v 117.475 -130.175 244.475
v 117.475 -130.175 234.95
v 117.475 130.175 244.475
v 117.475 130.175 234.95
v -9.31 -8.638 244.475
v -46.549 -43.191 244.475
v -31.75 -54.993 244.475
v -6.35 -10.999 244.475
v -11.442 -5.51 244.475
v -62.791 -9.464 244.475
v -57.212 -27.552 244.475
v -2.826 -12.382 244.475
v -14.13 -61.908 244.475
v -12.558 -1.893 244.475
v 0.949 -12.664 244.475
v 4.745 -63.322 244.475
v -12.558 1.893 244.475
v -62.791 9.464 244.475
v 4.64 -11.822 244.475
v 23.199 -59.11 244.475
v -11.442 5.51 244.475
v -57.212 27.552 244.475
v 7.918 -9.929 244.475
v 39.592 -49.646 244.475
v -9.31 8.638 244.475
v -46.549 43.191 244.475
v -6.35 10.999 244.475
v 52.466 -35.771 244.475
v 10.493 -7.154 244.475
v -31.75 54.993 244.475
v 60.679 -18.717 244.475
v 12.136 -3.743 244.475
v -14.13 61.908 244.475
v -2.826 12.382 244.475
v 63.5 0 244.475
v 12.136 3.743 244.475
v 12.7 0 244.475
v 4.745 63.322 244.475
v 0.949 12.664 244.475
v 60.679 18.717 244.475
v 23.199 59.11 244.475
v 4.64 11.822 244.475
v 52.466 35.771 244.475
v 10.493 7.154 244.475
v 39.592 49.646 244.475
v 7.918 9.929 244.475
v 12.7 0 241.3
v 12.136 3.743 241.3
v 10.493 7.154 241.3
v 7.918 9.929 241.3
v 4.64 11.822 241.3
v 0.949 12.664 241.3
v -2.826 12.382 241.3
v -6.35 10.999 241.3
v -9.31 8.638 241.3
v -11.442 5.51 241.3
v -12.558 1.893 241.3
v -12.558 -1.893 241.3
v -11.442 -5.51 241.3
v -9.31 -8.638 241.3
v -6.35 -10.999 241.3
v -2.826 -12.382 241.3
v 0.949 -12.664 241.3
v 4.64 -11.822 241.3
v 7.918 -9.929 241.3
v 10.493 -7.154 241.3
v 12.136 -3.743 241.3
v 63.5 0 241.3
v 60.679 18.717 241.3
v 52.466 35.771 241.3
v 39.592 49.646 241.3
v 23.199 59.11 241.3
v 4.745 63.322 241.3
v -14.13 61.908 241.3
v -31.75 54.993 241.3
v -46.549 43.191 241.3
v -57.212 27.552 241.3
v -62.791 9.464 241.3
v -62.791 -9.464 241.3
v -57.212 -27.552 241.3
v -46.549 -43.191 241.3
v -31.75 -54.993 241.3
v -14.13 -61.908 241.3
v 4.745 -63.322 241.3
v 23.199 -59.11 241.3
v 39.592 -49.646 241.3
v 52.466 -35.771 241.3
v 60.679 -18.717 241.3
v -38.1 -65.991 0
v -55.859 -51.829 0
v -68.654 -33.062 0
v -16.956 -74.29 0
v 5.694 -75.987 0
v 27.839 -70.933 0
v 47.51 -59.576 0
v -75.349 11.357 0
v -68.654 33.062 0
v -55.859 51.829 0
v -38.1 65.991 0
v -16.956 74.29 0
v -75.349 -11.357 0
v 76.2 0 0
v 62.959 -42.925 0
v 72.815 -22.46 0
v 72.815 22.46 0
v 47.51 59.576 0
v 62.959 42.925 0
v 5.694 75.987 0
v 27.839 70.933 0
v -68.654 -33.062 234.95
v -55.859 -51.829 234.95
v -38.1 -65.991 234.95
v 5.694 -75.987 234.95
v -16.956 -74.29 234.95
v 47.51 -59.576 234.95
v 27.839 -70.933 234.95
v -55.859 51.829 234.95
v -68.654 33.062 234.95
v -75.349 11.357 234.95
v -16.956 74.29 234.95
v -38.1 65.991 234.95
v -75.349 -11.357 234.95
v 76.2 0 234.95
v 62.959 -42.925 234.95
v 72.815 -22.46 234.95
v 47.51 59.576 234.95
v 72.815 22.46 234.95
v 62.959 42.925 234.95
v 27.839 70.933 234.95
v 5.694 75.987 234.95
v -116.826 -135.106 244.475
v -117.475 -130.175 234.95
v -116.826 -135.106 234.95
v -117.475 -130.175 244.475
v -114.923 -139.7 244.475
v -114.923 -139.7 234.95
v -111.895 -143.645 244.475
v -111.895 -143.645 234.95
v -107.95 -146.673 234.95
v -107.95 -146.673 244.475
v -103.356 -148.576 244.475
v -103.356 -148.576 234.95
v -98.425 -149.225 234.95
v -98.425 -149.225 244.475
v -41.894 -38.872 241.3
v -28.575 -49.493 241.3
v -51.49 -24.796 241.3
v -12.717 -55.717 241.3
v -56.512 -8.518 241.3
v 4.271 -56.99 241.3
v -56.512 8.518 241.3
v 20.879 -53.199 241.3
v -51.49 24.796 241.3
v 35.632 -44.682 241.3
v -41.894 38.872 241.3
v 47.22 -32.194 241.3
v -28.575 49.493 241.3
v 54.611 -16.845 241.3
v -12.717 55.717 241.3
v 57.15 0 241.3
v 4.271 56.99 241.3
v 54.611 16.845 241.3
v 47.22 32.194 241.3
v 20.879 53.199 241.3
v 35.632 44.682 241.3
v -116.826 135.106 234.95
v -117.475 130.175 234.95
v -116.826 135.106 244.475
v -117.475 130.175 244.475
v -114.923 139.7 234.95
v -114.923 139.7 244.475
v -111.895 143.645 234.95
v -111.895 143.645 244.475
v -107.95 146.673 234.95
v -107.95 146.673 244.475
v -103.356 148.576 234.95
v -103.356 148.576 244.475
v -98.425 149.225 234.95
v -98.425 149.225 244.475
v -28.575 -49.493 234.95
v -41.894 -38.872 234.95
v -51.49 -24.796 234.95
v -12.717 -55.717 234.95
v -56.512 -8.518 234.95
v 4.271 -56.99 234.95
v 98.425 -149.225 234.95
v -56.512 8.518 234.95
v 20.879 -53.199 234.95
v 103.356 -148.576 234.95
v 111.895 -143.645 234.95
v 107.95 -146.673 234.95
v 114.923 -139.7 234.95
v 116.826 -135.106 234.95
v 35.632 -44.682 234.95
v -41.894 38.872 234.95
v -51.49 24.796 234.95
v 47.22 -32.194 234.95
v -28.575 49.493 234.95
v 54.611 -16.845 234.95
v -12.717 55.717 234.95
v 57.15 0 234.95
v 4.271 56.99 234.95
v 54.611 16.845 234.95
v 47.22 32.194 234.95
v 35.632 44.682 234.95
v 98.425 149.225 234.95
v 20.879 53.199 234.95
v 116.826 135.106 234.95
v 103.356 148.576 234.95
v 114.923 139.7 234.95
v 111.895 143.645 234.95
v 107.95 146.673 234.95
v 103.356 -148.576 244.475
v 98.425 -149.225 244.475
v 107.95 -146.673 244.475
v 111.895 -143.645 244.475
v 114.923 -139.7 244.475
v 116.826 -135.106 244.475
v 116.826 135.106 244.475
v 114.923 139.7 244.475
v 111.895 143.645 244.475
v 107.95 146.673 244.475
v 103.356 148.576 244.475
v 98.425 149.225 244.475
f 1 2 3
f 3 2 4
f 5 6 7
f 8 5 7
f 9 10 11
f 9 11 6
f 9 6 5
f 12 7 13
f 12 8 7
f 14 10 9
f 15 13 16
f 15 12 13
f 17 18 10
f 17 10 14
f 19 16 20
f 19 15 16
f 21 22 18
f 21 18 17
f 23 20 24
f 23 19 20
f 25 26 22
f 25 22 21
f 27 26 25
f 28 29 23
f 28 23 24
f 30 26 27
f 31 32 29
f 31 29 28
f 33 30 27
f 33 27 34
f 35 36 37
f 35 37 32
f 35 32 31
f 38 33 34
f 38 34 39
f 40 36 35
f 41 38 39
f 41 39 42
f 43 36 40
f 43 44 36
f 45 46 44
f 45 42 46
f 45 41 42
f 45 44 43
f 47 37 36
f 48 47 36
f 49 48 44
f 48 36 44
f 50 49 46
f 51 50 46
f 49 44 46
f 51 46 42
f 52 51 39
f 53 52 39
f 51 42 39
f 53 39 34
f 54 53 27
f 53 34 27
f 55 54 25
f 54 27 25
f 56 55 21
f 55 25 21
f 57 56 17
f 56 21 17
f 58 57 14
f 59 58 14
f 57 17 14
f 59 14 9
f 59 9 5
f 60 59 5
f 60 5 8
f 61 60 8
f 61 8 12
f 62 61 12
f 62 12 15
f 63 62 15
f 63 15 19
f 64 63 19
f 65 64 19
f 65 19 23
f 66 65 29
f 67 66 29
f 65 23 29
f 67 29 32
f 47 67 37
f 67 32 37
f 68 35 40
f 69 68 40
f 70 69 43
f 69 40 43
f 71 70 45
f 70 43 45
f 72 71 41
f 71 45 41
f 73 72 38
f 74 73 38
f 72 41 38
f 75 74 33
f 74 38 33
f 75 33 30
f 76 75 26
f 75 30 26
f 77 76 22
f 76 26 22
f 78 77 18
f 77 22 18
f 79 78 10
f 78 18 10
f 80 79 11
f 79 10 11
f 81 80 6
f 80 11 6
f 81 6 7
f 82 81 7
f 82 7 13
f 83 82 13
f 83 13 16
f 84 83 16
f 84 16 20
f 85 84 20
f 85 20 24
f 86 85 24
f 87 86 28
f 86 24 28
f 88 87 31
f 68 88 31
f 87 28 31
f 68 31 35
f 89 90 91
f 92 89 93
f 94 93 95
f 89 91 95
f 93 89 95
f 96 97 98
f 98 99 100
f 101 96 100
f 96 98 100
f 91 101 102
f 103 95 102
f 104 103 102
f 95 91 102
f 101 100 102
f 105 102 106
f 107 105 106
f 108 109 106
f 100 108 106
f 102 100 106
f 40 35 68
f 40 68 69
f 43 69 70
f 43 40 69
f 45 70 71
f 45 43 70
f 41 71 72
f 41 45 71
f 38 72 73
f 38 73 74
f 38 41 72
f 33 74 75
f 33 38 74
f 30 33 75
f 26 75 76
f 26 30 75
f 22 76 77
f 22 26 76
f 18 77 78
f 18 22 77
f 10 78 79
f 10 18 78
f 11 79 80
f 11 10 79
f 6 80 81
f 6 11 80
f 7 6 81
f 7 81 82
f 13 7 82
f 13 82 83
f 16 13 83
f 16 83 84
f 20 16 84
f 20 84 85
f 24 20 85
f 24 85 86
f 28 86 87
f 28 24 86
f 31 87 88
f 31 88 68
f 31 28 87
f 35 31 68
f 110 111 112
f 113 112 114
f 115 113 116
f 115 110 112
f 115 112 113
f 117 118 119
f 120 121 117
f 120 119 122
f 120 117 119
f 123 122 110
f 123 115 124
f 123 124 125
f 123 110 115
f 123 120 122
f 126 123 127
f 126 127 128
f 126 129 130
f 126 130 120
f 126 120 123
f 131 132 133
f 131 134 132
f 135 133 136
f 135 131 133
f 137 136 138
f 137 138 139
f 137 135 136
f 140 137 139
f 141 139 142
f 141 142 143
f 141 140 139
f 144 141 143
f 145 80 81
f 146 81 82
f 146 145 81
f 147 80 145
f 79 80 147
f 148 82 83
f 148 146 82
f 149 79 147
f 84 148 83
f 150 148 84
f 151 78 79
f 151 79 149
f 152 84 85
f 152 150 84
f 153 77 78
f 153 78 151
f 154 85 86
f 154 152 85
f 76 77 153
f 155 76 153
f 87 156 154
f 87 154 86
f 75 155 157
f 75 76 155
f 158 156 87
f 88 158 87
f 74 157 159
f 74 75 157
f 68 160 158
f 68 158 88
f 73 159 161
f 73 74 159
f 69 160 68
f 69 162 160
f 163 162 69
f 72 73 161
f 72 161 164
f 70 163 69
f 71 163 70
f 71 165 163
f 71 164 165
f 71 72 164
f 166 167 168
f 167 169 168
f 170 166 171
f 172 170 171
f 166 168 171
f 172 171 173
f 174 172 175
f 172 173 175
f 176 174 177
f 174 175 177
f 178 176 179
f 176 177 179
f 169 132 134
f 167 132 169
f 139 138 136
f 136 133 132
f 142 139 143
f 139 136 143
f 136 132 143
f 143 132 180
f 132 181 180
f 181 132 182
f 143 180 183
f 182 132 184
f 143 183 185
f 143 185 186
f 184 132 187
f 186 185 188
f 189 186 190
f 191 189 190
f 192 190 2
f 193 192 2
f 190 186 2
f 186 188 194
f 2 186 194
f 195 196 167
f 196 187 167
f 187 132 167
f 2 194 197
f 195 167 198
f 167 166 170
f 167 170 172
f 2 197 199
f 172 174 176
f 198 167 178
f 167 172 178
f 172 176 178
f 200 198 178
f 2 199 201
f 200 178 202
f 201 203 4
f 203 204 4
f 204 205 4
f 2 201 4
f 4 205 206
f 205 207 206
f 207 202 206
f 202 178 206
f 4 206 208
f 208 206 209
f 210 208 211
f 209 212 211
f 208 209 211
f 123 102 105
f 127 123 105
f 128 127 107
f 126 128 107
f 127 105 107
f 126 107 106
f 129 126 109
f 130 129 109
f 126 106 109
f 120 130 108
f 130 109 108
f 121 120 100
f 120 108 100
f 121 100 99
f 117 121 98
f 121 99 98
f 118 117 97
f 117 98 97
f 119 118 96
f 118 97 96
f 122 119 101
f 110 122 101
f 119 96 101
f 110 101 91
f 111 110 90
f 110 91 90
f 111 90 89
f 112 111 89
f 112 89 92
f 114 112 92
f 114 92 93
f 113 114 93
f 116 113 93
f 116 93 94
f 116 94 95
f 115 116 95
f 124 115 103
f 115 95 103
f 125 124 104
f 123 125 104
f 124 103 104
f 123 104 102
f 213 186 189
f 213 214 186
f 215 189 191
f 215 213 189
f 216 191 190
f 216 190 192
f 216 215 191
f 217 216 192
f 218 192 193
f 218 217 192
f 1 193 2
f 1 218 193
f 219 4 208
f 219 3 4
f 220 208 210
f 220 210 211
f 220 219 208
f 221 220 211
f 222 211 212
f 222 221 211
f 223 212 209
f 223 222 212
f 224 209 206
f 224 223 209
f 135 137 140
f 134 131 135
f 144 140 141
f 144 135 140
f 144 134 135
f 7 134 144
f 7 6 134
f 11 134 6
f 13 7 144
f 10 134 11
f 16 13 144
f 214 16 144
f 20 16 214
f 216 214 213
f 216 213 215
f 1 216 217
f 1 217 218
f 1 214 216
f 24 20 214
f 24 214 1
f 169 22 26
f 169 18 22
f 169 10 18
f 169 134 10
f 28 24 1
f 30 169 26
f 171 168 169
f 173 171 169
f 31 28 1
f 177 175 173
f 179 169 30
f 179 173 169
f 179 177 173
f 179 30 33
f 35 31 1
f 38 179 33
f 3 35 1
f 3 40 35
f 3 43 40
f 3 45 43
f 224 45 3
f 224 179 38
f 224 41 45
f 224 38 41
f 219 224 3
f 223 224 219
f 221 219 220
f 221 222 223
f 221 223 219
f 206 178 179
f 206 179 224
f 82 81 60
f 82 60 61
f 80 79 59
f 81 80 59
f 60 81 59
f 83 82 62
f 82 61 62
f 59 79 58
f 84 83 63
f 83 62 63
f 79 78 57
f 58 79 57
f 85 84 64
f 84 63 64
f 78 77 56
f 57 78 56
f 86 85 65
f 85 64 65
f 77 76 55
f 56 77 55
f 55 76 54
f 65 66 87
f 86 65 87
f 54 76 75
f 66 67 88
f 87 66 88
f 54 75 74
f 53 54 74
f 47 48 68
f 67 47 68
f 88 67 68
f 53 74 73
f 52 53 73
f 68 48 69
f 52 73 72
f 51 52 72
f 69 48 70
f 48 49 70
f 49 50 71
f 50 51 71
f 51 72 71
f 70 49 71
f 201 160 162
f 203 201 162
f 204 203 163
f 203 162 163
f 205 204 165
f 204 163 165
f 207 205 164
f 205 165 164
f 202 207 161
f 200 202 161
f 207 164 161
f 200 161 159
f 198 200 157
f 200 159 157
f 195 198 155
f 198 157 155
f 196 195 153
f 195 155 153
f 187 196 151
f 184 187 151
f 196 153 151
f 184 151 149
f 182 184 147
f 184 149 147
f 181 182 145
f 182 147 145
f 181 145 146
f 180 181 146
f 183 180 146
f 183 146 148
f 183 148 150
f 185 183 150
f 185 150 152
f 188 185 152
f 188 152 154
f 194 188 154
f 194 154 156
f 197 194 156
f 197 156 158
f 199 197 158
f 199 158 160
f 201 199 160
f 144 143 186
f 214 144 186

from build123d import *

# Parameters (mm, degrees)
F0_R      = 76.2
F1_DEPTH  = 234.95
F2_W      = 234.95
F2_H      = 298.45
F2_R      = 76.2
F3_DEPTH  = 9.525
F4_R      = 19.05
F6_DEPTH  = 3.175
F7_R      = 57.15
F8_DEPTH  = 241.301
F9_R      = 63.5
F9_R_2    = 12.7
F10_DEPTH = 3.175


# Not quite as in the source:
# - a length typed as a fraction of an inch, garbled in the dataset ("3 / 203.2 mm" for 3/8 in), is restored


with BuildPart() as f1:
    # F0 (on Top) → F1 (new body)
    with BuildSketch(Plane.XY):
        Circle(F0_R)
    extrude(amount=F1_DEPTH)


with BuildPart() as f3:
    # F2 (on face) → F3 (new body)
    with BuildSketch(Plane.XY.offset(234.95)):
        Rectangle(F2_W, F2_H)
        Circle(F2_R, mode=Mode.SUBTRACT)
        Circle(F2_R)
    extrude(amount=F3_DEPTH)

    # F4
    f4_edges = [f3.edges().sort_by_distance(p)[0] for p in [
        (117.475, -149.225, 239.7125),
        (-117.475, -149.225, 239.7125),
        (117.475, 149.225, 239.7125),
        (-117.475, 149.225, 239.7125),
    ]]
    fillet(f4_edges, radius=F4_R)

    # F5 (on face) → F6 (cut)
    with BuildSketch(Plane.XY.offset(244.475)):
        with BuildLine():
            ThreePointArc((-63.5, 0), (0, -63.5), (63.5, 0))
            Line((63.5, 0), (-63.5, 0))
        make_face()
        with BuildLine():
            Line((-63.5, 0), (63.5, 0))
            ThreePointArc((63.5, 0), (0, 63.5), (-63.5, 0))
        make_face()
    extrude(amount=-F6_DEPTH, mode=Mode.SUBTRACT)

    # F7 (on face) → F8 (cut, through all)
    with BuildSketch(Plane.XY.offset(241.3)):
        Circle(F7_R)
    extrude(amount=-F8_DEPTH, mode=Mode.SUBTRACT)


with BuildPart() as f10:
    # F9 (on face) → F10 (new body, through all)
    with BuildSketch(Plane.XY.offset(244.475)):
        Circle(F9_R)
        Circle(F9_R_2, mode=Mode.SUBTRACT)
    extrude(amount=-F10_DEPTH)


solid = Compound([f1.part, f3.part, f10.part])
